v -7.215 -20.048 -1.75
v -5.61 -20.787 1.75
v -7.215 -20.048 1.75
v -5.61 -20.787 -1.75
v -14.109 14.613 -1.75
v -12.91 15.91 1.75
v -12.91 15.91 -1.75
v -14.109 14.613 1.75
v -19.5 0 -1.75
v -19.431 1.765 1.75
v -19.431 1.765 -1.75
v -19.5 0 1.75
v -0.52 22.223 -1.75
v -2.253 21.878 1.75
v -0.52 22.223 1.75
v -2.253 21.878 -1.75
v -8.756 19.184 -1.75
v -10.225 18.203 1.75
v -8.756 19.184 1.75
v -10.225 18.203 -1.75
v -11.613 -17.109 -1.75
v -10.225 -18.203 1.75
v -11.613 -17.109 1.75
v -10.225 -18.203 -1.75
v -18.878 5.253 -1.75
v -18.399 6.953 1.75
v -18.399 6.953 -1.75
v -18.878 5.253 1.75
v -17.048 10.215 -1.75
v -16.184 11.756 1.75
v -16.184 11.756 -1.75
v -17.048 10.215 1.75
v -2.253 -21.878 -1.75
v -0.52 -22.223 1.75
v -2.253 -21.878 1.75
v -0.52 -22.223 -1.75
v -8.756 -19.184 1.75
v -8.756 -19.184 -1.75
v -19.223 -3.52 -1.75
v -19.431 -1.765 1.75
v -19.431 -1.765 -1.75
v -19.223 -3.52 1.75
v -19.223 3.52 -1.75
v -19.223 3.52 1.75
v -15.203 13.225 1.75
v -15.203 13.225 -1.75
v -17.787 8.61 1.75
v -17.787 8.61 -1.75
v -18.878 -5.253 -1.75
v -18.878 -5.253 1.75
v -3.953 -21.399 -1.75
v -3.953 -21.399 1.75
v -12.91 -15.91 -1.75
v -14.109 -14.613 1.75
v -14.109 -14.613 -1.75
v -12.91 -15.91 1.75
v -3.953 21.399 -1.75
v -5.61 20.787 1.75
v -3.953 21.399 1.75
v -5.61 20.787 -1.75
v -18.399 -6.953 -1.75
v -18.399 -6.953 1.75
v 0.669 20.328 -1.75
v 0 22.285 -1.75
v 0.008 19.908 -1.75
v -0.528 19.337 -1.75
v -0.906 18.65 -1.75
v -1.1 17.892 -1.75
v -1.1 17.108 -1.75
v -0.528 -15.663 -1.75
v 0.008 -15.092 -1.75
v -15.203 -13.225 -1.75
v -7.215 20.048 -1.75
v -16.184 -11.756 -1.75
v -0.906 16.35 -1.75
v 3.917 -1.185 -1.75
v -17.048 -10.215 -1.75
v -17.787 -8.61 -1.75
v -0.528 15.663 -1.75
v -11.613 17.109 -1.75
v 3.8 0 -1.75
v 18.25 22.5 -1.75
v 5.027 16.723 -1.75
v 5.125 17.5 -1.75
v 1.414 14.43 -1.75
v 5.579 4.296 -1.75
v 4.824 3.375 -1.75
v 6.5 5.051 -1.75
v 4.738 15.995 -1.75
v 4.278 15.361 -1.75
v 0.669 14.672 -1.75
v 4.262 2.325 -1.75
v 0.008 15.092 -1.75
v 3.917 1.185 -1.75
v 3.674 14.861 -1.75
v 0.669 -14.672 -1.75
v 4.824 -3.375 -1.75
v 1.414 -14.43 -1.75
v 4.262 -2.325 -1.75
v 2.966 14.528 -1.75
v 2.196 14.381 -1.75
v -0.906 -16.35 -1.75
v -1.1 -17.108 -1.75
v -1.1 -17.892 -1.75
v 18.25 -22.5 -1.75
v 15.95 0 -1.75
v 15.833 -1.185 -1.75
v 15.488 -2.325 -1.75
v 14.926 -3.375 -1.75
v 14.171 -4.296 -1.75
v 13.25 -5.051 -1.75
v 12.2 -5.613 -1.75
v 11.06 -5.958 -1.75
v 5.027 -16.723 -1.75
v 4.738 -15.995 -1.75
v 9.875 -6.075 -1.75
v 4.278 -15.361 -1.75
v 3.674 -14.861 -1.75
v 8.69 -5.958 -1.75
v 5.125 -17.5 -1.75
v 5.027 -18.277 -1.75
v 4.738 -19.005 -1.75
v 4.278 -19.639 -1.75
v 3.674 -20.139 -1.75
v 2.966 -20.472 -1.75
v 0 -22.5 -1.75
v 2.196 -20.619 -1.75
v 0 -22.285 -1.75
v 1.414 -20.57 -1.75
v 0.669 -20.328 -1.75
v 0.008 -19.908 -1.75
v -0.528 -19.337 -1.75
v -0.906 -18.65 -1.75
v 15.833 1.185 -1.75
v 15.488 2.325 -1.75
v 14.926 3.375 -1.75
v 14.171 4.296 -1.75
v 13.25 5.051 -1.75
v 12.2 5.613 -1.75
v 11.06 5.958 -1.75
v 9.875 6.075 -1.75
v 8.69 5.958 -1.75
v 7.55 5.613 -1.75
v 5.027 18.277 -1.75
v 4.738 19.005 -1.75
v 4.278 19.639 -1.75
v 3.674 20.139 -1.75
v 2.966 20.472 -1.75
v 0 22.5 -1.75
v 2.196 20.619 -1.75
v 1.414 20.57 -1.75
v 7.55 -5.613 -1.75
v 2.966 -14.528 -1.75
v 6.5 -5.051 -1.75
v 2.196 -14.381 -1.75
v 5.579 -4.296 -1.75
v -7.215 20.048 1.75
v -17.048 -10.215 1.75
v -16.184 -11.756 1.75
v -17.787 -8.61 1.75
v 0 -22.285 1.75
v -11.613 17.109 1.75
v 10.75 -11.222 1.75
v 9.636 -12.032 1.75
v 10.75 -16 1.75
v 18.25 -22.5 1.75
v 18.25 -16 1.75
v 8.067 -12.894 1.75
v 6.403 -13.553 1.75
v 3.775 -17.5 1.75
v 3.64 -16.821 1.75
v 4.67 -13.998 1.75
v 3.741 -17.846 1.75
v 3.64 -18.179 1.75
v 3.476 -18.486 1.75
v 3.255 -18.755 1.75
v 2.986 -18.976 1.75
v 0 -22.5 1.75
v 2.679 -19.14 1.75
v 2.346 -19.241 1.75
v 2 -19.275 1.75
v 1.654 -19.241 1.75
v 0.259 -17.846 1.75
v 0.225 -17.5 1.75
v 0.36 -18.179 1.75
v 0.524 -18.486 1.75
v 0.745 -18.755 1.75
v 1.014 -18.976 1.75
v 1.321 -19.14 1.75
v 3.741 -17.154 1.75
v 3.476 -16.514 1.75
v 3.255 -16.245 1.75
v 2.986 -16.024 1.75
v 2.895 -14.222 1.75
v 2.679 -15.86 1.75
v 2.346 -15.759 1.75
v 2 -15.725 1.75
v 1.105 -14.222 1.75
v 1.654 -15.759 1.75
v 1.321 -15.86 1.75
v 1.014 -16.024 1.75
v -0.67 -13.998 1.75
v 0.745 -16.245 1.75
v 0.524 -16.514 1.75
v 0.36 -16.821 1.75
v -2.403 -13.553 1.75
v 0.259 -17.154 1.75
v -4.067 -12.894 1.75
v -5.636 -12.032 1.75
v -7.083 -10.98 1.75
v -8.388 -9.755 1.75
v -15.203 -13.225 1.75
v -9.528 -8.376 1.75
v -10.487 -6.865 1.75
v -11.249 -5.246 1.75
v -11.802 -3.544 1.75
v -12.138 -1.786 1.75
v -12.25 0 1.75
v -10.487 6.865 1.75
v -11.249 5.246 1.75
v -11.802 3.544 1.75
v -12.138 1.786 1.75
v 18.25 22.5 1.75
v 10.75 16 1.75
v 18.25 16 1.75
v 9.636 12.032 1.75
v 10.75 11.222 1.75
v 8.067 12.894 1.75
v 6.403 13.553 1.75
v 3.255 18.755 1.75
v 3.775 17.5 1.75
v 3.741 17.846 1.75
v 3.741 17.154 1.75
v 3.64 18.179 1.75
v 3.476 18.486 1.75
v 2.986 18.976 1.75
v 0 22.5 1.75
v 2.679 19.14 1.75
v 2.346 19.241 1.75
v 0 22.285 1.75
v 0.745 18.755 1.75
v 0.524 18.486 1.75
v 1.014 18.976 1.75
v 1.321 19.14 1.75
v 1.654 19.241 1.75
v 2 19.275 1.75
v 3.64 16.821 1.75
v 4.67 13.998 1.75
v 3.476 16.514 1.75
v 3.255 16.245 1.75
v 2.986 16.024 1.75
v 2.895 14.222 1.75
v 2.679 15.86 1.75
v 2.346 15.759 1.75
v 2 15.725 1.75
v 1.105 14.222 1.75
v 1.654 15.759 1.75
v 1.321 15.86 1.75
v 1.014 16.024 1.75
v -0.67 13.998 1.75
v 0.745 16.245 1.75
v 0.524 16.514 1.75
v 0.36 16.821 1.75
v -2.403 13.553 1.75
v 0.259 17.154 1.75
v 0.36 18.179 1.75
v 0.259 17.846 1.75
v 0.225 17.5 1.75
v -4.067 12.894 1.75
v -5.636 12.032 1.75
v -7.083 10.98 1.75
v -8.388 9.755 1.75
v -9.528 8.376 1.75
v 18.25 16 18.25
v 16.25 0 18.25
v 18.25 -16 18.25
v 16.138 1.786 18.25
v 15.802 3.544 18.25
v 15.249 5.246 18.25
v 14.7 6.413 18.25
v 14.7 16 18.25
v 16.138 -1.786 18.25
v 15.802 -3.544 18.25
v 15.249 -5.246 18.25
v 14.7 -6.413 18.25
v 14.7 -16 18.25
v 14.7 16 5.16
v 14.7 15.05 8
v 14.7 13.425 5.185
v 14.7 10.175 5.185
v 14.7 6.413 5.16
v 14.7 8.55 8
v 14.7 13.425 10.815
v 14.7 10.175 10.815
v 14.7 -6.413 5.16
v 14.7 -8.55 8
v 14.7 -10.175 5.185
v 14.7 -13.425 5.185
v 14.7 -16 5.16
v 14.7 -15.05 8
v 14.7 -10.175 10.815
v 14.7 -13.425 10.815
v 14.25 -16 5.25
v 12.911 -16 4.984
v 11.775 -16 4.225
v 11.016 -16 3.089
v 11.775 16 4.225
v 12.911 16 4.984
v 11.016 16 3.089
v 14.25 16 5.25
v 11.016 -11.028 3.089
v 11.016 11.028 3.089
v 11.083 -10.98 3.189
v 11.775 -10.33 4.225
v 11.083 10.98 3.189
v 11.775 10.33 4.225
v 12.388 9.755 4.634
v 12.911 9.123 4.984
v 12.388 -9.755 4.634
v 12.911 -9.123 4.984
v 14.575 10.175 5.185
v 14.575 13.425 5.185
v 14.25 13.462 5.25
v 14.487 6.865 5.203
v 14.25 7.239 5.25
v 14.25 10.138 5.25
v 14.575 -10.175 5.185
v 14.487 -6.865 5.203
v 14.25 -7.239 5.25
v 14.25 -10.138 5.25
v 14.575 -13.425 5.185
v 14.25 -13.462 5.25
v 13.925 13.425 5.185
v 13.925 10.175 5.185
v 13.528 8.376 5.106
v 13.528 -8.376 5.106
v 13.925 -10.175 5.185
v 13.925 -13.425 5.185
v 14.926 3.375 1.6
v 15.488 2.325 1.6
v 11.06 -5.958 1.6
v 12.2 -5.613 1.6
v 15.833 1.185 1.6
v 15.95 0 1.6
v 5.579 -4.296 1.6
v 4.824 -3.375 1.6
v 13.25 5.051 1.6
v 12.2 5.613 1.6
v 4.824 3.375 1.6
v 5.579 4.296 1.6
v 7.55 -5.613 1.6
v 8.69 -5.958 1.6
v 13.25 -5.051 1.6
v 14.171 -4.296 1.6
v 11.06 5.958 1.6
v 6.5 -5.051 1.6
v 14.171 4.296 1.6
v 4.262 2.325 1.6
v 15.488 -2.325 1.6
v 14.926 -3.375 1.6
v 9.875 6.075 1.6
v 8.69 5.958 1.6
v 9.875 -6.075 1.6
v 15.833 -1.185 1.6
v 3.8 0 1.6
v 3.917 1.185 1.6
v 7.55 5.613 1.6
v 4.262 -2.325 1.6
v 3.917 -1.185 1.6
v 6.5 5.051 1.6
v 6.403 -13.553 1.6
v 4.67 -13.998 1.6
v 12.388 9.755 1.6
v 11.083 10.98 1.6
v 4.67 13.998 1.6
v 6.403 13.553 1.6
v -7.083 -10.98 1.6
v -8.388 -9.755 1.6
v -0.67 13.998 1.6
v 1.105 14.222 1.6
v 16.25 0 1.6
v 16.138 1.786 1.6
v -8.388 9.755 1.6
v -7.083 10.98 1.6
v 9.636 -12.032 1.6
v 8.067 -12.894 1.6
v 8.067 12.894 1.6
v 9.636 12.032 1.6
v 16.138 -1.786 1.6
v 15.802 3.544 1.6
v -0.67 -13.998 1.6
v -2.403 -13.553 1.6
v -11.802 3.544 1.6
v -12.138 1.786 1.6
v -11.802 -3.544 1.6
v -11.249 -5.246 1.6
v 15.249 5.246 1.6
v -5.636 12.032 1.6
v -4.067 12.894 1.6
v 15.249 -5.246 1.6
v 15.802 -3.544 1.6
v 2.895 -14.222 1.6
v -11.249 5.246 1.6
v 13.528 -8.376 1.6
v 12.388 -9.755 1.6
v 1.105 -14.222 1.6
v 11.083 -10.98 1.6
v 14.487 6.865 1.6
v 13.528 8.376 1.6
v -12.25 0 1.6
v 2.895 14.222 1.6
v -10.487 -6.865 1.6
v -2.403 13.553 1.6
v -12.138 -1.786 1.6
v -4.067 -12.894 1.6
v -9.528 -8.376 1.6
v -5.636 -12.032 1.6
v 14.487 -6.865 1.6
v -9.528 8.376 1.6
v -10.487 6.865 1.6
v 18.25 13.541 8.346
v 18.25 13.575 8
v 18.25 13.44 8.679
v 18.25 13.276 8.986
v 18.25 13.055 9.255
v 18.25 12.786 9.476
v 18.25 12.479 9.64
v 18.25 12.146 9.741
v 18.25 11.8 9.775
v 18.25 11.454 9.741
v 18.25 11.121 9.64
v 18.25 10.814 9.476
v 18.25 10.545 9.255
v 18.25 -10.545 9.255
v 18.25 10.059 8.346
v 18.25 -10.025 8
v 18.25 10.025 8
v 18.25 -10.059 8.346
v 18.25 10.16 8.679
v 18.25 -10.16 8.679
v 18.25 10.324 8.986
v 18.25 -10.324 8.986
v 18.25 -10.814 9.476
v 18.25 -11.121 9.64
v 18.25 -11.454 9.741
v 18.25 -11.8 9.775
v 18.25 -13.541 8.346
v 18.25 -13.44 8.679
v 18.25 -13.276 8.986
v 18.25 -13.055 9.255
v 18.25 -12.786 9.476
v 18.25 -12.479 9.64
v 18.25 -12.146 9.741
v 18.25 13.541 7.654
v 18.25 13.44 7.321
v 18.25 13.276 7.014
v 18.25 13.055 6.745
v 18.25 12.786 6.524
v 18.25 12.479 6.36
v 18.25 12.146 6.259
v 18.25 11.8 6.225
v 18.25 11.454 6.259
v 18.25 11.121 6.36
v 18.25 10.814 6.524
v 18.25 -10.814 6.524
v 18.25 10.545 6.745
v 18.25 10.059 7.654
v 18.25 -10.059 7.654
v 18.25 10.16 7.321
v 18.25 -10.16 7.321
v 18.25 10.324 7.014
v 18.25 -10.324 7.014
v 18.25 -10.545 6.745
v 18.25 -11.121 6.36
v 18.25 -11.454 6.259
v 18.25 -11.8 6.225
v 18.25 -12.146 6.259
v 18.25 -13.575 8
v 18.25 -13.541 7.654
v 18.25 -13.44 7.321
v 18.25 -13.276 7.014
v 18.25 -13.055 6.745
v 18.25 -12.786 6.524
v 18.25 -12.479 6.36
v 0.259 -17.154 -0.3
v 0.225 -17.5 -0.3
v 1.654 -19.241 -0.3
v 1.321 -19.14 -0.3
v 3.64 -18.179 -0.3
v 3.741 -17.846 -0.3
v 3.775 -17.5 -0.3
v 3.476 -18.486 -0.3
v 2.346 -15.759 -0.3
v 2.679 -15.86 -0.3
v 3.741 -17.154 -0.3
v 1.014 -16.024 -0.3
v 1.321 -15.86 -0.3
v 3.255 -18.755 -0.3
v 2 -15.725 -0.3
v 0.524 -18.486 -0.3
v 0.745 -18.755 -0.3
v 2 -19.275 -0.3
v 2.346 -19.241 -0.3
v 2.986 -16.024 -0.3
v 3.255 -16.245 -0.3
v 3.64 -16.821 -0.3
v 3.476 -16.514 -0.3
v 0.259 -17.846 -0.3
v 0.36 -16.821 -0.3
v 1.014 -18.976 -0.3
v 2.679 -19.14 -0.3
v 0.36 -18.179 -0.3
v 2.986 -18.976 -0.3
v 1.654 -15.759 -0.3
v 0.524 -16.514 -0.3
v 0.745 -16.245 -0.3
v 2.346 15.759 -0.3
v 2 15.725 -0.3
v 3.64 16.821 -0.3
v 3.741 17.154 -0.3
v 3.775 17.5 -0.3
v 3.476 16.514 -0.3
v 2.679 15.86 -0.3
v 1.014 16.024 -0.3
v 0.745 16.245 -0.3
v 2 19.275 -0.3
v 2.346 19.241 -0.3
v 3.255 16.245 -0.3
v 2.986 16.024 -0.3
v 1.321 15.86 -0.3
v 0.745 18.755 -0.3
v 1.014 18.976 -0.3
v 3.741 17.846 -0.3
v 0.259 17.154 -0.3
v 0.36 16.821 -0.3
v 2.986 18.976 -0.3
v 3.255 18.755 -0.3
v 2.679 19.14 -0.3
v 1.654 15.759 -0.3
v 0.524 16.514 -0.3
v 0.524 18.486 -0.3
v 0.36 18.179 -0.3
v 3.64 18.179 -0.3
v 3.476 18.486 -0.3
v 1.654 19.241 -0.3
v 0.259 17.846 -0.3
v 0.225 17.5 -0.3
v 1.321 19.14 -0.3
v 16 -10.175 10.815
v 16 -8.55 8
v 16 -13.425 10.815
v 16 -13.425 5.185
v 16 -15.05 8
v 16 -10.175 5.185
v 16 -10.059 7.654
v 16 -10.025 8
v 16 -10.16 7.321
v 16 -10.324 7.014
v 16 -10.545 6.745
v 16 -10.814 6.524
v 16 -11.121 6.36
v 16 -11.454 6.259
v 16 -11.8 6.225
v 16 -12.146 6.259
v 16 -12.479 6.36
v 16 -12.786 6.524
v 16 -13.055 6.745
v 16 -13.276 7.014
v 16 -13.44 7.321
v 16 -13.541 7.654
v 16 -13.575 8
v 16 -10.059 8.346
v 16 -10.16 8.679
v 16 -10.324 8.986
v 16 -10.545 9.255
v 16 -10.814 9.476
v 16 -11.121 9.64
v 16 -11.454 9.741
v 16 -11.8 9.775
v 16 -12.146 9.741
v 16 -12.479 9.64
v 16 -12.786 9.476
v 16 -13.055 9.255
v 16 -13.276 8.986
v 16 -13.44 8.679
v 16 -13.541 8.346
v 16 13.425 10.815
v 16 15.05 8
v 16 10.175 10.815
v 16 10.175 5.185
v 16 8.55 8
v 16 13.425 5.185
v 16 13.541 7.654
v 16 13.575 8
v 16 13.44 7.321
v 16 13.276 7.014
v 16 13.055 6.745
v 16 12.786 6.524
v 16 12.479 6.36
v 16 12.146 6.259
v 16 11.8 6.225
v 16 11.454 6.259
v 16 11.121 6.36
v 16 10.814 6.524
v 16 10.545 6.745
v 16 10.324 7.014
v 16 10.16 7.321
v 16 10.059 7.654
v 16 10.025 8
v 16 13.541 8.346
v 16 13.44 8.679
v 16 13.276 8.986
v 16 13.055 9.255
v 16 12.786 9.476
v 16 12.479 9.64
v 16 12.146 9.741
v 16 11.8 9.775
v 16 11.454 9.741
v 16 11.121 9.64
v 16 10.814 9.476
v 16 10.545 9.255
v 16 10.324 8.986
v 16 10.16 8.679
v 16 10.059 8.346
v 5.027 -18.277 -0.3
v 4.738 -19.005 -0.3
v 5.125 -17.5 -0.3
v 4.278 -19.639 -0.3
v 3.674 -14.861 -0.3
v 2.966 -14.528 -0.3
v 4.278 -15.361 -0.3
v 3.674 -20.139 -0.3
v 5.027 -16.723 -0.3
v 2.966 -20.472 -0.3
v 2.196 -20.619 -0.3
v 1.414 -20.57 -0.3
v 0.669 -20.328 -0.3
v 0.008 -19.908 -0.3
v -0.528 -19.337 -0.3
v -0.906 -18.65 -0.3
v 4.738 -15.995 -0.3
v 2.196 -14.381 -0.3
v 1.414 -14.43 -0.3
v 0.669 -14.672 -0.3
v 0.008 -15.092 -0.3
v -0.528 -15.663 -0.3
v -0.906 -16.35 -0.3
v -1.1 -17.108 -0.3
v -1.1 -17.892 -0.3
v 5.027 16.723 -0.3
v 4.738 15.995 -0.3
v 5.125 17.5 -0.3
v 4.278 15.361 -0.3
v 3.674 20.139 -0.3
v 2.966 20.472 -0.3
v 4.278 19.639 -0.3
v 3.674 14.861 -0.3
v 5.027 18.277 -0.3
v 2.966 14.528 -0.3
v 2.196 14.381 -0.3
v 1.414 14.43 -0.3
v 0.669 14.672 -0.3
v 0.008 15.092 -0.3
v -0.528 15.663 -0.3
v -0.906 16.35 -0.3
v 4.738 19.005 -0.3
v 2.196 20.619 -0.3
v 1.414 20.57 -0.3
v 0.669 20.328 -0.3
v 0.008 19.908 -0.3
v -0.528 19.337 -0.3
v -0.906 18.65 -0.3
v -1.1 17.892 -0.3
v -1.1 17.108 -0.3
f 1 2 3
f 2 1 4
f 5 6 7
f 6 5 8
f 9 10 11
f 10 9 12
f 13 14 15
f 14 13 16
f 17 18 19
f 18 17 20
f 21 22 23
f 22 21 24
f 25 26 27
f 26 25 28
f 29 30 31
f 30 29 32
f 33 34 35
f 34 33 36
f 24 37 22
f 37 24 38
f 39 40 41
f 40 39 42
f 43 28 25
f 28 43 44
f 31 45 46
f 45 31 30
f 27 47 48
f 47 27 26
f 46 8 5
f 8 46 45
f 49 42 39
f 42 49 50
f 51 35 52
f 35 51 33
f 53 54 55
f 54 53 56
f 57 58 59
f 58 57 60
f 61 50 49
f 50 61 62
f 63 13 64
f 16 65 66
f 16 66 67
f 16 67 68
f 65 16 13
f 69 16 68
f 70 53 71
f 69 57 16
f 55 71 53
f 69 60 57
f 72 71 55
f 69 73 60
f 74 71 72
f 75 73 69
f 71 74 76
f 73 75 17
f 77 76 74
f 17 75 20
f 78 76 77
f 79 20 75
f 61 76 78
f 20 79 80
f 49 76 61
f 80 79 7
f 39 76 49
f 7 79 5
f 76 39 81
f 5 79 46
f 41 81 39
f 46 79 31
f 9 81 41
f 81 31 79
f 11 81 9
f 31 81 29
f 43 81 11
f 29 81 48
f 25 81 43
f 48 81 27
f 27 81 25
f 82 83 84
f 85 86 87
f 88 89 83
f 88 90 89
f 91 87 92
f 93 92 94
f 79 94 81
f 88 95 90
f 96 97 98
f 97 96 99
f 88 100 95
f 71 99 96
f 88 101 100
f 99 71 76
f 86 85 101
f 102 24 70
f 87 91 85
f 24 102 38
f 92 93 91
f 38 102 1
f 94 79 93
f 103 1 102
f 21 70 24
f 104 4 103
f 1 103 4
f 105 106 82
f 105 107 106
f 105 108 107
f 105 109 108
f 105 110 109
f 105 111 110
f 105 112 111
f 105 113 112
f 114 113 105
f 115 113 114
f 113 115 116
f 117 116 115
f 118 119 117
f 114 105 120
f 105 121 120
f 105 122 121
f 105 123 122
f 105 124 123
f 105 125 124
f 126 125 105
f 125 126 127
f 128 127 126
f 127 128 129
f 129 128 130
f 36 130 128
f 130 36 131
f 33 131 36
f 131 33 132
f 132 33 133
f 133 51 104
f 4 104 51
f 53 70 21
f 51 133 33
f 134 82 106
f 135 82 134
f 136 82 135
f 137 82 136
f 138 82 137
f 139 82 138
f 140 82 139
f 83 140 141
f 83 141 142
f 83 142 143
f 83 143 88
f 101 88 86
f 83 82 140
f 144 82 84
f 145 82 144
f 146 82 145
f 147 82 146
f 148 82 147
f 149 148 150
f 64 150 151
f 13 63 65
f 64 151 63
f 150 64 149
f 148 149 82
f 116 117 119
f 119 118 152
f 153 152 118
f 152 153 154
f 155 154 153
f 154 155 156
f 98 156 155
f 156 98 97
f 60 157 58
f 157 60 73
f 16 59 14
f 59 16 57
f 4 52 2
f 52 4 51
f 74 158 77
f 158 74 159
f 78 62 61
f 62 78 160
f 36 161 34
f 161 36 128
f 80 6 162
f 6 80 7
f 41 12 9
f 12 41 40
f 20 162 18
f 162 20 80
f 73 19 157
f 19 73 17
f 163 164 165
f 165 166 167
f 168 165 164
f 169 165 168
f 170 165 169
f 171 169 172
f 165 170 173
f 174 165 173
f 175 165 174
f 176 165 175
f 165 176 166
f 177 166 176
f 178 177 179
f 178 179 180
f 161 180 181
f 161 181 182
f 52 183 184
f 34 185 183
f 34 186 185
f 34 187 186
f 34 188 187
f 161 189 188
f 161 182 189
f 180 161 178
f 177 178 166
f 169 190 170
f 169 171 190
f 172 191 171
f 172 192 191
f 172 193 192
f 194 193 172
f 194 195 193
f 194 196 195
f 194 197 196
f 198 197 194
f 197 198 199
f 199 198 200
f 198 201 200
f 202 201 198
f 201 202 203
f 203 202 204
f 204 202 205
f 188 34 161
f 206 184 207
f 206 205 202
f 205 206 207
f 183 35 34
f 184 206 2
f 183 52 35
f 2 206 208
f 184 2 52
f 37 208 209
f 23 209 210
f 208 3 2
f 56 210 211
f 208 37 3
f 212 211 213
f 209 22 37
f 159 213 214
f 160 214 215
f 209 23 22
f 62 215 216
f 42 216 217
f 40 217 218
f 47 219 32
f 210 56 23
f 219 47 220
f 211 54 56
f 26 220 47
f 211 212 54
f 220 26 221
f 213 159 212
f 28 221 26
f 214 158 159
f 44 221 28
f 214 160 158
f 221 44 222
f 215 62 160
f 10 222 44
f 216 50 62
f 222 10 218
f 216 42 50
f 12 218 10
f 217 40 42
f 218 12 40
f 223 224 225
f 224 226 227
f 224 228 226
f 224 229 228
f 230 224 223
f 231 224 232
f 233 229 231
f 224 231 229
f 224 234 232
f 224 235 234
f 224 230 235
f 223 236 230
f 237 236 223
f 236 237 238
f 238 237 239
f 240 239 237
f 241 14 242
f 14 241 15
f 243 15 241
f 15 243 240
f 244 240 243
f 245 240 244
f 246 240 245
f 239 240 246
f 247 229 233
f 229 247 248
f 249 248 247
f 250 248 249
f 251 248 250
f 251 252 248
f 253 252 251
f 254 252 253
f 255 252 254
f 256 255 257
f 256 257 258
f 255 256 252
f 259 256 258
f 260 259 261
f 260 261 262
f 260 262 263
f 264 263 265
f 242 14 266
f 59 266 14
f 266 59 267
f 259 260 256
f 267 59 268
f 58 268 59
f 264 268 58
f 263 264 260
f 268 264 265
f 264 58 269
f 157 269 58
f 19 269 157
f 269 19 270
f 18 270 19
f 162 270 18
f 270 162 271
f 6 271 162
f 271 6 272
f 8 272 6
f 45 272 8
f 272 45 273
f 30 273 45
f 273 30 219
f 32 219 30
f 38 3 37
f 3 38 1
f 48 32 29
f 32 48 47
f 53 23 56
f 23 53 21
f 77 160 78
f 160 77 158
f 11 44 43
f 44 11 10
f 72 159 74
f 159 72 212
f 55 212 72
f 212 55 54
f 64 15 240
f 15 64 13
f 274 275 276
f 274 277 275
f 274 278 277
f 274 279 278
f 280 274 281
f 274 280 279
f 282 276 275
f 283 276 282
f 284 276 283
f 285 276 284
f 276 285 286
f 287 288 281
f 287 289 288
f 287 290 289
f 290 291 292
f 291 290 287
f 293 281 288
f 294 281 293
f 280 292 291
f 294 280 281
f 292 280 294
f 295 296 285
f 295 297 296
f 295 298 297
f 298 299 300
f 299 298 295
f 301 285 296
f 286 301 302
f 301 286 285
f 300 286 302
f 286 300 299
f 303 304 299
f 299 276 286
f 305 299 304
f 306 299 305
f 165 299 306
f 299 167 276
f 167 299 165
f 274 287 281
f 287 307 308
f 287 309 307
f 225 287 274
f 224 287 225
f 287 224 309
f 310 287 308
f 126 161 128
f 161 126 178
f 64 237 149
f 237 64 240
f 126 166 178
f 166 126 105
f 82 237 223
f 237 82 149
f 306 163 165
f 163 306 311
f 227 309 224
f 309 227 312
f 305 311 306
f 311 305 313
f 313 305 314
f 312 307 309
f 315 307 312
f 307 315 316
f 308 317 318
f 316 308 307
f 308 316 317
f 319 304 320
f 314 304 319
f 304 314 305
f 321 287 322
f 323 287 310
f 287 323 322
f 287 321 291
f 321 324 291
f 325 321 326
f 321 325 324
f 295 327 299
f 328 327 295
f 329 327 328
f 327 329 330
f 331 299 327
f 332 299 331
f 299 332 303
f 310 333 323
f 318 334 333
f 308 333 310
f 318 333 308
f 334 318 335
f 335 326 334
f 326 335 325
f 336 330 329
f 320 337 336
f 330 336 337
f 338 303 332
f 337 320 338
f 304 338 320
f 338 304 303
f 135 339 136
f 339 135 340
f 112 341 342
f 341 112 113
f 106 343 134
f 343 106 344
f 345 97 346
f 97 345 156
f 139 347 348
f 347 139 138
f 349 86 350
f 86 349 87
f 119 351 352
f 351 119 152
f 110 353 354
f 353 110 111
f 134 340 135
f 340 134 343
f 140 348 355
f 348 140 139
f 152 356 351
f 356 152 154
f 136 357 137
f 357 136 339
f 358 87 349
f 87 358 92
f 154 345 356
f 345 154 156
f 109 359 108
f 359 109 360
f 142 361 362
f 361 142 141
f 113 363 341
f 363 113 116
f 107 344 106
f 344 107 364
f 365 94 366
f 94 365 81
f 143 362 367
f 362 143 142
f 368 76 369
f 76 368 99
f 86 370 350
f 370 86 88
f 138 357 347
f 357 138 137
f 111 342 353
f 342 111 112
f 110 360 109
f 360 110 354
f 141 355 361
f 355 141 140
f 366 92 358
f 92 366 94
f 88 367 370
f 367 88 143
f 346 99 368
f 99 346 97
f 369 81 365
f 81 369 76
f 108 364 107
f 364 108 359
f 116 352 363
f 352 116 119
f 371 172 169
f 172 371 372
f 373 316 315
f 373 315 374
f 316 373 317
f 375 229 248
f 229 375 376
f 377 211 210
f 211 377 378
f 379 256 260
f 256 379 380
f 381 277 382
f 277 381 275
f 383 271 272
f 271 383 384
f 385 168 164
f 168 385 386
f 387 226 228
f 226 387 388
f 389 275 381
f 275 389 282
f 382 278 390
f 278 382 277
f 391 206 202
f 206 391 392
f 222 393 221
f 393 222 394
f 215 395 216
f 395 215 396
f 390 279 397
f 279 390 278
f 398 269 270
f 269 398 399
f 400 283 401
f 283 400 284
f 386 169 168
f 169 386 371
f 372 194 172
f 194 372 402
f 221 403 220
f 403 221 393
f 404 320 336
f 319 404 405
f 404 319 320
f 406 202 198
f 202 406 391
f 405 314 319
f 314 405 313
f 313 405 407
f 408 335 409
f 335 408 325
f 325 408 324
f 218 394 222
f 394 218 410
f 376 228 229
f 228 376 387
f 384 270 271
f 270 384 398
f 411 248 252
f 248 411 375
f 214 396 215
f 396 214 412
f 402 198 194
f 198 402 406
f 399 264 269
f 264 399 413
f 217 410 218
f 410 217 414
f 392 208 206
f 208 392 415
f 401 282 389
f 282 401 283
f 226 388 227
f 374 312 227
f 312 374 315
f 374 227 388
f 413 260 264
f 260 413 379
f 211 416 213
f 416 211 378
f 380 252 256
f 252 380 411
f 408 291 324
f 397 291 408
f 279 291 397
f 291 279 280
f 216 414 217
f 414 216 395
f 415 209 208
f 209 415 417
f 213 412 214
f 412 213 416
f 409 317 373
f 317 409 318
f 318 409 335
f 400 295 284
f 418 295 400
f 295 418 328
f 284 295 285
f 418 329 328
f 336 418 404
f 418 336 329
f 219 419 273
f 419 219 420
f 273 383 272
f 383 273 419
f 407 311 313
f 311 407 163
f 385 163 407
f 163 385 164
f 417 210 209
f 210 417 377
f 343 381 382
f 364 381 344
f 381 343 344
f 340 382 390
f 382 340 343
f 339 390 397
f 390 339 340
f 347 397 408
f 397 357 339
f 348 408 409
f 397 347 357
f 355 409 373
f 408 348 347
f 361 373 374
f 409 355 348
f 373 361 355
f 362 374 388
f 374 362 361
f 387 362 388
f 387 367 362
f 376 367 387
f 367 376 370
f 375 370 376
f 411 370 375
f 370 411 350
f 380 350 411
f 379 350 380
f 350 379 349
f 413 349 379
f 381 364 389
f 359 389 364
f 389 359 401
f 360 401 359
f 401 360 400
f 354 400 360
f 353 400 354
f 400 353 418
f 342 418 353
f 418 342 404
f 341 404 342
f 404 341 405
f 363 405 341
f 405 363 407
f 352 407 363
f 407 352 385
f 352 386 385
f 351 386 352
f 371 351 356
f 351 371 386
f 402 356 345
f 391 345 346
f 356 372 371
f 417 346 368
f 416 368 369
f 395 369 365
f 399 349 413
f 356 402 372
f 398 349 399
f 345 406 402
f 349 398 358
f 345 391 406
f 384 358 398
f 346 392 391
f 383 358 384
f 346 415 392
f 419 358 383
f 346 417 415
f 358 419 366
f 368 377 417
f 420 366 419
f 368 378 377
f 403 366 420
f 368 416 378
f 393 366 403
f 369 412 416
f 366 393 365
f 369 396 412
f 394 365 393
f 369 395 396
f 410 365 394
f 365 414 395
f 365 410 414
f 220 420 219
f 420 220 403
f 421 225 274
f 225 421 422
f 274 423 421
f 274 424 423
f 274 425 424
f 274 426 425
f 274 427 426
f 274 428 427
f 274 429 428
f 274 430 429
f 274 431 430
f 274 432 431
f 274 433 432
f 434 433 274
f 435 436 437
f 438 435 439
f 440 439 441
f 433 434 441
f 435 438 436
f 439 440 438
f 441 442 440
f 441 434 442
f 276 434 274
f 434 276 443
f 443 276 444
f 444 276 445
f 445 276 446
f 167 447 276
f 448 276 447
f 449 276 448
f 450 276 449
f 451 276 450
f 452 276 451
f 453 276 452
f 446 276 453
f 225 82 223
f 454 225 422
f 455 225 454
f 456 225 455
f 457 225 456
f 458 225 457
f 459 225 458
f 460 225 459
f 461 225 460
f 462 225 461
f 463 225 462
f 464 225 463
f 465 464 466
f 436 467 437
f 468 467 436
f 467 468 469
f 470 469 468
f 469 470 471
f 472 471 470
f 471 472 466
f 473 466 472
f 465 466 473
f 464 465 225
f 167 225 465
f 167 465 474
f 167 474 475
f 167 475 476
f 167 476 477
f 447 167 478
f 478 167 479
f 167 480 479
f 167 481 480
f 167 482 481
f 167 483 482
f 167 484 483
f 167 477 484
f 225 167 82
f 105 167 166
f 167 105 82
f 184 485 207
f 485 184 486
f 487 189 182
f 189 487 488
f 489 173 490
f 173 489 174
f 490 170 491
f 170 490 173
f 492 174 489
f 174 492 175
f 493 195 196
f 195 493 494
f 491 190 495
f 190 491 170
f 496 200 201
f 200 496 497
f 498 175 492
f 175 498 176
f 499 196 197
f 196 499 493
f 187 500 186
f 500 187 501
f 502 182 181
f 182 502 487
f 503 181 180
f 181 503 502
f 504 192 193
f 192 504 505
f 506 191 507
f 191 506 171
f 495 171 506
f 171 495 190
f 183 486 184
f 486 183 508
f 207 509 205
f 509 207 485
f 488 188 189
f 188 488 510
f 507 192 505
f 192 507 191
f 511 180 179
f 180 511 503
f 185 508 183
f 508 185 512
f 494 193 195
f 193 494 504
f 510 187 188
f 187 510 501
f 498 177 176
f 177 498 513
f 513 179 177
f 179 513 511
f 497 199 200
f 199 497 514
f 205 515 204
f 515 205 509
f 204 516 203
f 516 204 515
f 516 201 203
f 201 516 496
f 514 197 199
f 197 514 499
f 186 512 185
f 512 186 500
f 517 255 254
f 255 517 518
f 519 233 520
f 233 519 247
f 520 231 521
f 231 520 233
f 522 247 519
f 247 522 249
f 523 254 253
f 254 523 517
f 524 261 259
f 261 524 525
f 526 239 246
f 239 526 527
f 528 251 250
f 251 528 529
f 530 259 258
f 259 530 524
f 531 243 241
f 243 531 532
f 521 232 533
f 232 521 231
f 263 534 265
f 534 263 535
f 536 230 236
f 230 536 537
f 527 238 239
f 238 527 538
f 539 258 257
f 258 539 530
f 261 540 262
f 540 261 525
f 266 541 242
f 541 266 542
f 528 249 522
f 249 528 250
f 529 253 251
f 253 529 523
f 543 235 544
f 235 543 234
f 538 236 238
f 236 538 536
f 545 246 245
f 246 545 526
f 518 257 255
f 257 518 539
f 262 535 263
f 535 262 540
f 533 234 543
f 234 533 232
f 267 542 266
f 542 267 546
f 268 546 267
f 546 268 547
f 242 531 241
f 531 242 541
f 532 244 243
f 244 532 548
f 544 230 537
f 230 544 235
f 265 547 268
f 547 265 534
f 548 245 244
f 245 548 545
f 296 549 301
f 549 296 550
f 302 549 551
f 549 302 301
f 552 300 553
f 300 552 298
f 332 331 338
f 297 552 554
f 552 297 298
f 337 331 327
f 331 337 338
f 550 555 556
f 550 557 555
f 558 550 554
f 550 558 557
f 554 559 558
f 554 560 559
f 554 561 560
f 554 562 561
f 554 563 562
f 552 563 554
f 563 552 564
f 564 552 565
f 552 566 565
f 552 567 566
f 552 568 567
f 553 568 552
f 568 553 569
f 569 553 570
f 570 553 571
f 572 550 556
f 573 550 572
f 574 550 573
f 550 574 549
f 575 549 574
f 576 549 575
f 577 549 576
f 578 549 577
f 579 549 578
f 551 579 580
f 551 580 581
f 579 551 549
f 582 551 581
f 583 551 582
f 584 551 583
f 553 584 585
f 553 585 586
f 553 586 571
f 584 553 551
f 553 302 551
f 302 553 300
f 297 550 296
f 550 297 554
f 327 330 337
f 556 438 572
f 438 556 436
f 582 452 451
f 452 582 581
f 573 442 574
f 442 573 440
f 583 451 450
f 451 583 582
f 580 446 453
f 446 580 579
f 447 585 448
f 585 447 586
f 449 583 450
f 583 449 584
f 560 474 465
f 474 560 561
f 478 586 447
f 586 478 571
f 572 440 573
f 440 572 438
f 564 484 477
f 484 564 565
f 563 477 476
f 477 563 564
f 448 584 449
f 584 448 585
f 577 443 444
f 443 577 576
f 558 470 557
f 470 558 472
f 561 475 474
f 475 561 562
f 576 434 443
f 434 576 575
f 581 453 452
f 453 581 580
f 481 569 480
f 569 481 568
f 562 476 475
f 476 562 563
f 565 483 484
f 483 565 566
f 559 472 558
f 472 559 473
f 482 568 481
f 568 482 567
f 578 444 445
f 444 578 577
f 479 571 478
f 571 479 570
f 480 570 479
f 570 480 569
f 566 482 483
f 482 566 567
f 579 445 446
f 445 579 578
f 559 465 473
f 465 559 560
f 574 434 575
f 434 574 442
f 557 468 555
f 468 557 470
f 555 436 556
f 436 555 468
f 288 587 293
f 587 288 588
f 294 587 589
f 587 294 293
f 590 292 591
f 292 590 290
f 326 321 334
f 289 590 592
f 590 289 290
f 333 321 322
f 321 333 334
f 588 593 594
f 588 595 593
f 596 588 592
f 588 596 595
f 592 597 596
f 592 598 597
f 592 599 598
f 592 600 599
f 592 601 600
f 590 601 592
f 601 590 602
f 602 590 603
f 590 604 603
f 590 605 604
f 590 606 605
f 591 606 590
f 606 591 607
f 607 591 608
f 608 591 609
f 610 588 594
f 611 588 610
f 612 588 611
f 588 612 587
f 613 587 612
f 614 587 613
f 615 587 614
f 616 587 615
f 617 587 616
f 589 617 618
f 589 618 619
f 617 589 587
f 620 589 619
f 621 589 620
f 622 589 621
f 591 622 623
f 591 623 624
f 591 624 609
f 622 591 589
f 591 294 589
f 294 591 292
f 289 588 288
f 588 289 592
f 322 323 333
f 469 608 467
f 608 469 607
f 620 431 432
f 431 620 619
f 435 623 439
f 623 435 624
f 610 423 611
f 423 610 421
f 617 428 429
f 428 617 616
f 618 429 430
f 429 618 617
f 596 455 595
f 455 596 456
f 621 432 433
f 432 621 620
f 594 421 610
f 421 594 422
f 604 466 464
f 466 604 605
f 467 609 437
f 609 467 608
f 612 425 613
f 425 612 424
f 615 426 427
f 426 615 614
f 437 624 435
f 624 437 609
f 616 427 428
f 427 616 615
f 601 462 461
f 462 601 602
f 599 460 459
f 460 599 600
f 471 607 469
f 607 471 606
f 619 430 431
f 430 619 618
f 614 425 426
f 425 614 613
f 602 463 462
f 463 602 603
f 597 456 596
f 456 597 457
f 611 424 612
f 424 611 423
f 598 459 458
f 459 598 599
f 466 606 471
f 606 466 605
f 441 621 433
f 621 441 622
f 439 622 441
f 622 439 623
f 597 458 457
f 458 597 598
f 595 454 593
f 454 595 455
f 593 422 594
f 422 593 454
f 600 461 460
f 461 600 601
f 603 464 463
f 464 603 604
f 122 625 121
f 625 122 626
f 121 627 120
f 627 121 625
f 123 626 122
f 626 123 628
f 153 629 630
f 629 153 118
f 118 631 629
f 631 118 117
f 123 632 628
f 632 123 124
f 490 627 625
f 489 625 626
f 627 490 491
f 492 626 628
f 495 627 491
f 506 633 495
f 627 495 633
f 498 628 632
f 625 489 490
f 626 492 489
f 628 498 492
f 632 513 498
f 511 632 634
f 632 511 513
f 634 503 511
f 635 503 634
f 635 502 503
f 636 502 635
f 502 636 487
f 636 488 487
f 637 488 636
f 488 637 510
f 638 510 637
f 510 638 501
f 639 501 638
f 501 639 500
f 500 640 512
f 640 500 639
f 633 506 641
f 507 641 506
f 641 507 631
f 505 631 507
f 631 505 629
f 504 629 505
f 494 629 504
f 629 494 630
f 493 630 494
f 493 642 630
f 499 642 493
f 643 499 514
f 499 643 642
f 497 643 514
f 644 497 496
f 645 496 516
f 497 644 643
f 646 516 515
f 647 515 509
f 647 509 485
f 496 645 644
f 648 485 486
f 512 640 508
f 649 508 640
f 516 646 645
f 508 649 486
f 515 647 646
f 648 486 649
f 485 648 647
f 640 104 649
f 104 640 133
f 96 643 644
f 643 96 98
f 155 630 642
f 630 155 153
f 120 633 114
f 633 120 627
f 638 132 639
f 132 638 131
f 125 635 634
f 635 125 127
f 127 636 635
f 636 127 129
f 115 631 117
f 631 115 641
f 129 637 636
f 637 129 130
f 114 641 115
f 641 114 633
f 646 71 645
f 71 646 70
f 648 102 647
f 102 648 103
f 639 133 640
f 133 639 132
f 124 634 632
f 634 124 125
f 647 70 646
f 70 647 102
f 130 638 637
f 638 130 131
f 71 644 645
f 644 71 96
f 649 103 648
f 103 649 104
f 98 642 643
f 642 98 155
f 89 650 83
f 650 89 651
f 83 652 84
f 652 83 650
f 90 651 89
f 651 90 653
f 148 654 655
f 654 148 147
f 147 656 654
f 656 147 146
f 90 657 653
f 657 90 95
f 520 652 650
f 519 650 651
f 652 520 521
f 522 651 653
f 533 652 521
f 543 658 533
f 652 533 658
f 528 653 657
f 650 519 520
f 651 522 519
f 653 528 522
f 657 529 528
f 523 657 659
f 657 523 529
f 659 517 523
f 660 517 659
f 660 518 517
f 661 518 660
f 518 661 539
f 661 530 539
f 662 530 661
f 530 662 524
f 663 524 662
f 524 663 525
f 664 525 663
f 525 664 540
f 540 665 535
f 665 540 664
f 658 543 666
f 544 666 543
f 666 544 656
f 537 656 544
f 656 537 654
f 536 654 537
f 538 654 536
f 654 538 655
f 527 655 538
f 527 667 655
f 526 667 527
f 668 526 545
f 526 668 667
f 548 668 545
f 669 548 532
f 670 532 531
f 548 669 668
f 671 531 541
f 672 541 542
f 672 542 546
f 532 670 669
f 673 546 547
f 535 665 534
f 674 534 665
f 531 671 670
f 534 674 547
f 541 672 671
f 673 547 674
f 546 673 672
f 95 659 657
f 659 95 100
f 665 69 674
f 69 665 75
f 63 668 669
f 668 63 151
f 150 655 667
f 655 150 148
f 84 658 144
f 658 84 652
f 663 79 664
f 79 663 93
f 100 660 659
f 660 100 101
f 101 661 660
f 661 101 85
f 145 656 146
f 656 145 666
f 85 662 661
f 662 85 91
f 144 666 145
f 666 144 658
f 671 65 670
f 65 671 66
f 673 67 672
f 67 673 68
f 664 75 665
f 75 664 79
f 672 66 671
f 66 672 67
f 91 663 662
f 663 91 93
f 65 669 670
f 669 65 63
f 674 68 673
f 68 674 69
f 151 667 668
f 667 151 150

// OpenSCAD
// Original :http://www.thingiverse.com/thing:423357
// Bracket for  28BYJ-48 stepper motor
// 28BYJ-48 model from RGriffoGoes www.thingiverse.com/thing:204734
// added details by J.Beale 21 July 2014
// Bracket by J.Beale 9 Aug 2014

slop = 0.25;  // printer tolerance

// =========================================================
// stepper motor body model

MBH = 18.8;   // motor body height
MBD = 28.25+slop;  // motor body OD
SBD = 9.1+slop;    // shaft boss OD
SBH = 1.45;   // shaft boss height above motor body
SBO = 7.875;  // offset of shaft/boss center from motor center
//SHD = 4.93+slop*2;   // motor shaft OD+ countersink for boss
SHD = 11.9+slop;   // motor shaft OD (larger clearance hole)
SHDF = 3.0;   // motor shaft diameter, across flats
SHHF = 6.0;   // motor shaft flats height, or depth in from end
SHHF = 0.0;   // assume round shaft for purposes of bracket
SHH = 9.75;   // height of shaft above motor body 

MBFH = 0.7;   // height of body edge flange protruding above surface
MBFW = 1.0+slop;   // width of edge flange
MBFNW = 8;    // width of notch in edge flange
MBFNW2 = 17.8;  // width of edge flange notch above wiring box

MHCC = 35.0;  // mounting hole center-to-center was 35
MTH  = 0.8;   // mounting tab thickness
MTW  = 0.0;   // mounting tab width
// MTHID = 4.0;  // mounting tab hole inner diameter
MTHID = 3.0;  // mounting tab hole inner diameter
WBH  = 16.7;  // plastic wiring box height
WBW  = 14.6+slop;  // plastic wiring box width
WBD  = 31.3+slop;  // body diameter to outer surface of wiring box

WRD = 1.0;     // diameter of electrical wires
WRL = 30;      // length of electrical wires
WRO = 2.2;		// offset of wires below top motor surface
// =========================================================
// right-angle bracket for motor

MSOD = 6.0 + slop;  // M3 mounting screw head diameter // WAS 5.9
MSTH = 1.5;  // M3 screw head thickness (for countersink)
//MSTH = 0; // set to zero for no screwhead countersink
MSSD = 3.3 + slop;  // M3 screw diameter clearance hole // WAS 3.1
Bthick = 3.5;  // thickness of bracket
Bdia = (MHCC+10);  // diameter of bracket face
M3nutDia = 6.5;

// =========================================================
fn = 80;
eps = 0.05;   // small number to avoid coincident faces

motorOffset = 3;


module StepMotor28BYJ()
{
  difference(){
    union(){
	   color("gray") translate([0,0,-(MBH+MBFH)/2])
	  difference() {  // flange at top rim
        // cylinder(h = MBFH+eps, r = MBD/2, center = true, $fn = 50);
         //cylinder(h = MBFH+2*eps, r = (MBD-MBFW)/2, center = true, $fn = 32);
			//cube([MBFNW,MHCC,MBFH*2],center=true); // notches in rim
			//cube([MBD+2*MBFW,SBD,MBFH*2],center=true);
		   //translate([-MBD/2,0,0]) cube([MBD,MBFNW2,MBFH*2],center=true);
        }
		color("gray") // motor body
			cylinder(h = MBH, r = MBD/2, center = true, $fn = 50);
		color("gray") translate([SBO,0,-SBH])	// shaft boss
			cylinder(h = MBH, r = SBD/2, center = true, $fn = 32);

		translate([SBO,0,-SHH])	// motor shaft
        difference() {
			color("gold") cylinder(h = MBH, r = SHD/2, center = true, $fn = 32);
				// shaft flats
		   color("red") translate([(SHD+SHDF)/2,0,-(eps+MBH-SHHF)/2]) 
				cube([SHD,SHD,SHHF], center = true);
		   color("red") translate([-(SHD+SHDF)/2,0,-(eps+MBH-SHHF)/2]) 
				cube([SHD,SHD,SHHF], center = true);
        }


		//color("Silver") translate([0,0,-(MBH-MTH-eps)/2]) // mounting tab 
		//	cube([MTW,MHCC,MTH], center = true);				
		//color("Silver") translate([0,MHCC/2,-(MBH-MTH)/2]) // mt.tab rounded end
		//	cylinder(h = MTH, r = MTW/2, center = true, $fn = 32);
		//color("Silver") translate([0,-MHCC/2,-(MBH-MTH)/2]) // mt.tab rounded end
		//	cylinder(h = MTH, r = MTW/2, center = true, $fn = 32);


		//color("blue") translate([-(WBD-MBD),0,eps-(MBH-WBH)/2]) // plastic wire box
		//	cube([MBD,WBW,WBH], center = true);
	    //color("blue") translate([-2,0,0])	
		//	cube([24.5,16,15], center = true);
		}

				// mounting holes in tabs on side
		color("red") translate([0,MHCC/2,-MBH/2])	
				cylinder(h = 2, r = MTHID/2, center = true, $fn = 32);
		color("red") translate([0,-MHCC/2,-MBH/2])	
				cylinder(h = 2, r = MTHID/2, center = true, $fn = 32);
		}
}



module MOT() {
 translate([motorOffset,0,-MBH/2 ]) 
 rotate([180,0,0]) StepMotor28BYJ();  // motor body (without wires)
}


module bracket() {
difference() {
 union() {
  translate([motorOffset,0,-Bthick/2]) cylinder(h=Bthick, r=Bdia/2, $fn=fn);  // round face
     
  echo(Bdia);
  translate([-eps + MBD/2 + 0.5,-32/2,-20+Bthick/2]) 
  		cube([5.5+eps,32,20]); // flange
     
     
  translate([-0,-Bdia/2,-Bthick/2]) 
	cube([Bdia,Bdia,Bthick]); // square edge joining round face to flange
  translate([MBD/2,32/2,-Bthick/2]) rotate([90,0,0]) 
  	cylinder(r=Bthick,h=32,$fn=16); // round fillet at flange
 }
 
 union() {
   translate([4+MBD/2,-MBD,-MBD]) cube([MBD*2,MBD*2,MBD*2]);
   translate([motorOffset - 1,MHCC/2,-10])	// motor mounting bolt
   			cylinder(h = 30, r = MSSD/2, center = true, $fn = 32);
   translate([motorOffset - 1,-MHCC/2,-10])	// motor mounting bole
				cylinder(h = 30, r = MSSD/2, center = true, $fn = 32);



   translate([1.0,11.8,-8]) rotate([0,90,0]) 	// flange mounting bolt
     rotate([0, 0, 30])
				cylinder(h = 30, d = M3nutDia, center = true, $fn = 6);   
   translate([10,11.8,-8]) rotate([0,90,0]) 	// flange mounting bolt
				//cylinder(h = 30, r = MSOD/2, center = true, $fn = 6);                
				cylinder(h = 30, r = MSSD/2, center = true, $fn = 32);
     
   translate([1.0,-11.8,-8]) rotate([0,90,0]) 	// flange mounting bolt
     rotate([0, 0, 30])     
				cylinder(h = 30, d = M3nutDia, center = true, $fn = 6);        
   translate([10,-11.8,-8]) rotate([0,90,0]) 	// flange mounting bolt
				cylinder(h = 30, r = MSSD/2, center = true, $fn = 32);

   color("white") translate([motorOffset - 1, MHCC/2,((Bthick/2) - MSTH + eps)]) 
	 cylinder(r=MSOD/2, h=MSTH, $fn=25); // motor screw countersink
   color("white") translate([motorOffset - 1,-MHCC/2,((Bthick/2) - MSTH + eps)])  
	 cylinder(r=MSOD/2, h=MSTH, $fn=25); // motor screw countersink

   translate([-1,0,-1.6]) MOT(); // body of motor
   //translate([0,0,-10]) cube([50,50,50]); // DEBUG cutaway view
 }
}
} // end module()

rotate([180,0,0]) bracket();  // show the motor bracket

//bracket();
//StepMotor28BYJ();
